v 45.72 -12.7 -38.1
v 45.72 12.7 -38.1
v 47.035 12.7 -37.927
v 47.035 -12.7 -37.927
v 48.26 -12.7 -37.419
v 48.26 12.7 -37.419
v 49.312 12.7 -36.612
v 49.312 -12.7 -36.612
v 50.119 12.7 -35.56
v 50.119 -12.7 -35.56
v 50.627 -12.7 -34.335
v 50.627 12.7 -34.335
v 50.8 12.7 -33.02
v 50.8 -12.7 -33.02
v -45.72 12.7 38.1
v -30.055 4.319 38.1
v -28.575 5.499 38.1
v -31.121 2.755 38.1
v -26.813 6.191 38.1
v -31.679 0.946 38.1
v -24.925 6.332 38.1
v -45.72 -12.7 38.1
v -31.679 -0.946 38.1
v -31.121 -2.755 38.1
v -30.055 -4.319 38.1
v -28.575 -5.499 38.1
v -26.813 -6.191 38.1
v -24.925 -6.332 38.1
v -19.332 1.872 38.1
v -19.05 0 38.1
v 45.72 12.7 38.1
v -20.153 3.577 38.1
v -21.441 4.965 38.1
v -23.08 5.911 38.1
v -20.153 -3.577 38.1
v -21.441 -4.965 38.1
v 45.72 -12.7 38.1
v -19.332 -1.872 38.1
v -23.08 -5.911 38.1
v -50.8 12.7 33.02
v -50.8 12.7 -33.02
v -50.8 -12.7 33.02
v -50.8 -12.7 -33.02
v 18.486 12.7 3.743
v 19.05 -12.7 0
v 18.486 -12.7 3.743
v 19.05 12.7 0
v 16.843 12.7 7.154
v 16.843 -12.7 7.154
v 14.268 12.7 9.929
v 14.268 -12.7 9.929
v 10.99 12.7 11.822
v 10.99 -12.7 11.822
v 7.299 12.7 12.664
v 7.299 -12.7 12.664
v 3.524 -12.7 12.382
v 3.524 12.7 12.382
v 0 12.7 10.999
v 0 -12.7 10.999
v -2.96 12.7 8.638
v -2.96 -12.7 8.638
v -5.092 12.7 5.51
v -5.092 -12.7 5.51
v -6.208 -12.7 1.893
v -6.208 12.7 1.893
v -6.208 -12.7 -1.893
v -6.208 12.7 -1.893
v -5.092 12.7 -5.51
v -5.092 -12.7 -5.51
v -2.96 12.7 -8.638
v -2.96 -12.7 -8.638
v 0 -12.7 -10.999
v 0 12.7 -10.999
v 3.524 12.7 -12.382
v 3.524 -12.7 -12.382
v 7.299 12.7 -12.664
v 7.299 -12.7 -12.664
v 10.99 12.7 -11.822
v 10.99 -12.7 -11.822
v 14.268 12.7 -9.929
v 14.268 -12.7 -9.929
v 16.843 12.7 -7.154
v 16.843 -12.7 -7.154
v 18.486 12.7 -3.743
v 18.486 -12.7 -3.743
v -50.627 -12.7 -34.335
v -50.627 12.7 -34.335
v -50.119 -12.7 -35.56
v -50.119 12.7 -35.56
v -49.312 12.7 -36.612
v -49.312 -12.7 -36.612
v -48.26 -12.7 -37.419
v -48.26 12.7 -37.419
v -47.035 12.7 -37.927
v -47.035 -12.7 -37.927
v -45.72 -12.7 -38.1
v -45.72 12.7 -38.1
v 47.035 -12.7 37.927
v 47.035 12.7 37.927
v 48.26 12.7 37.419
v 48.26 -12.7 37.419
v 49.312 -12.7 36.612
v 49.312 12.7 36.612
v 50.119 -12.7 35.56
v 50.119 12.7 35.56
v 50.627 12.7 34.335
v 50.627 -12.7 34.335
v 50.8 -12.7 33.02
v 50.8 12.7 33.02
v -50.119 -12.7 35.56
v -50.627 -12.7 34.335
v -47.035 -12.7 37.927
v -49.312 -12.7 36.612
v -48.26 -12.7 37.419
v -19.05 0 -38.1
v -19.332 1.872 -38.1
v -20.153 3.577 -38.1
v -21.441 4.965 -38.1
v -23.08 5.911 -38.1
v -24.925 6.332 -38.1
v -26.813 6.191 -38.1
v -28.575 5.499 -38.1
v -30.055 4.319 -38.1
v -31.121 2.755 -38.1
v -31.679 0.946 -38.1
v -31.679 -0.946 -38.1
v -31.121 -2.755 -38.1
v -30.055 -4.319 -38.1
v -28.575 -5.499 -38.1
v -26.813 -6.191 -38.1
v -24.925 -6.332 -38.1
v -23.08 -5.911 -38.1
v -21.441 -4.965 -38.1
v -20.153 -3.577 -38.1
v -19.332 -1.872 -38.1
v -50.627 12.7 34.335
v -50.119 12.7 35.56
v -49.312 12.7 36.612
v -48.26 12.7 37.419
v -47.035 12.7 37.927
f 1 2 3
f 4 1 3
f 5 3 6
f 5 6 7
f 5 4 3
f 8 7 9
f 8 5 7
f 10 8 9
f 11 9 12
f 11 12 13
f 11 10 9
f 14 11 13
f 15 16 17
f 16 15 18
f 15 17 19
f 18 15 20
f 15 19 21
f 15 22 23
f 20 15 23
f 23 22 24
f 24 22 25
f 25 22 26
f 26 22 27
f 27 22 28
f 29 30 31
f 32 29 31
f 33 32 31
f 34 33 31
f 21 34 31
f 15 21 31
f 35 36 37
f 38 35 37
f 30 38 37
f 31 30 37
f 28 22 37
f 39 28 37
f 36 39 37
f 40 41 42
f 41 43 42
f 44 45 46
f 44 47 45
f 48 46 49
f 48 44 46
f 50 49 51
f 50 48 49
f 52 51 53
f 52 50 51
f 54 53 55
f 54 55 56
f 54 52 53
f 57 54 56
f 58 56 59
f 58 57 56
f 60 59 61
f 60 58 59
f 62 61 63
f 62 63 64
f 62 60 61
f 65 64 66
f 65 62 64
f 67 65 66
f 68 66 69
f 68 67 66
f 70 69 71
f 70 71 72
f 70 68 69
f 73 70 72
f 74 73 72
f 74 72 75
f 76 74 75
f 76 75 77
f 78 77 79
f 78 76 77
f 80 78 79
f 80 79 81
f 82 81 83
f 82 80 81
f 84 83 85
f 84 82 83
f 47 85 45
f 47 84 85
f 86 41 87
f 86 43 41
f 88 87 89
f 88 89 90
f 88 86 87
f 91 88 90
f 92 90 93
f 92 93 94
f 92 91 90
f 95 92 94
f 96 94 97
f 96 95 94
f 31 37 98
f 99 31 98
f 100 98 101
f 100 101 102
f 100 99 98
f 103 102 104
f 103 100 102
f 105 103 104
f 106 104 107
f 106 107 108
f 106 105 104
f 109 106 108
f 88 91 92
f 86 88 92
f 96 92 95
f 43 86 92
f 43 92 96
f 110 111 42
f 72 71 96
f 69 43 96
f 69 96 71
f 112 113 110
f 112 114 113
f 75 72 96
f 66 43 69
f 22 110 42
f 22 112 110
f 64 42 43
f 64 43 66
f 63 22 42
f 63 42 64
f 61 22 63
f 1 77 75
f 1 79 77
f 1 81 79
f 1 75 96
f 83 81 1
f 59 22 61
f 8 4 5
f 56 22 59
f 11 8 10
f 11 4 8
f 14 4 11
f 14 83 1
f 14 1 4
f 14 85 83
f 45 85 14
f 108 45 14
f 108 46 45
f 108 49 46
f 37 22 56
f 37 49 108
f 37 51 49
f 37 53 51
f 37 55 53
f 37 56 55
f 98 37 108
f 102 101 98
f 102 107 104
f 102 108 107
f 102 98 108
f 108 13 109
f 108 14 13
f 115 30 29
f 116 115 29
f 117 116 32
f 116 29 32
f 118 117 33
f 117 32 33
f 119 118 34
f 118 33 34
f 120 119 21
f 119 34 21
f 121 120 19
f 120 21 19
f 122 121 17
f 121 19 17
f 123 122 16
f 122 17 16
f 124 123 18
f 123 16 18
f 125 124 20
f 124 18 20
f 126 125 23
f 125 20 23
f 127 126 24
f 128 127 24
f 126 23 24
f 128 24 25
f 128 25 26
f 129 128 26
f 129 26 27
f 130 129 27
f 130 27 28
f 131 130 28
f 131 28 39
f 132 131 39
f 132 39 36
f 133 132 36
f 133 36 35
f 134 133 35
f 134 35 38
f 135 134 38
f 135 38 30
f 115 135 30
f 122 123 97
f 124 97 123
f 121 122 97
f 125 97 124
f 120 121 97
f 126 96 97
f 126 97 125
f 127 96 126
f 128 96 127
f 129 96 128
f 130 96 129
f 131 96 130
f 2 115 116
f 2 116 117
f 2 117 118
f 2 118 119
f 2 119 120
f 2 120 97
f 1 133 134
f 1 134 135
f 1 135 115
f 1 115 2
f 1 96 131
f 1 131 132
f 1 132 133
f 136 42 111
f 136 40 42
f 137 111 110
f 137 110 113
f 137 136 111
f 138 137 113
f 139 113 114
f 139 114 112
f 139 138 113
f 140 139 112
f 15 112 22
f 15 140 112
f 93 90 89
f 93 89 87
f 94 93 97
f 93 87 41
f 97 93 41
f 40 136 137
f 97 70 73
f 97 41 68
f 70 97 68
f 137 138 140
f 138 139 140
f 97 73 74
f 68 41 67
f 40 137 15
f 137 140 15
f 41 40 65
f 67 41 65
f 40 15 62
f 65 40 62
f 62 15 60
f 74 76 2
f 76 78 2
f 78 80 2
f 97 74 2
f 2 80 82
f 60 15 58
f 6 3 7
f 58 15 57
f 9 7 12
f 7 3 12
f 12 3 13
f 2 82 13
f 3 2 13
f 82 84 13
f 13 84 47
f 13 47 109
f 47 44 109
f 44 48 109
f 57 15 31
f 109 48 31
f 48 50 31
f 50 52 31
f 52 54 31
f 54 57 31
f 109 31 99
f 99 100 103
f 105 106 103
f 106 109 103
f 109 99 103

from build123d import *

# Parameters (mm, degrees)
F0_W     = 101.6
F0_H     = 76.2
F0_R     = 12.7
F1_DEPTH = 12.7
F2_R     = 6.35
F3_DEPTH = 76.201
F4_R     = 5.08


with BuildPart() as f1:
    # F0 (on Front) → F1 (new body, symmetric)
    with BuildSketch(Plane.XZ):
        Rectangle(F0_W, F0_H)
        with Locations((6.35, 0)):
            Circle(F0_R, mode=Mode.SUBTRACT)
    extrude(amount=F1_DEPTH, both=True)

    # F2 (on face) → F3 (cut, through all)
    with BuildSketch(Plane.XY.offset(38.1)):
        with Locations((-25.4, 0)):
            Circle(F2_R)
    extrude(amount=-F3_DEPTH, mode=Mode.SUBTRACT)

    # F4
    f4_edges = [f1.edges().sort_by_distance(p)[0] for p in [
        (50.8, 0, 38.1),
        (-50.8, 0, 38.1),
        (50.8, 0, -38.1),
        (-50.8, 0, -38.1),
    ]]
    fillet(f4_edges, radius=F4_R)


solid = f1.part
